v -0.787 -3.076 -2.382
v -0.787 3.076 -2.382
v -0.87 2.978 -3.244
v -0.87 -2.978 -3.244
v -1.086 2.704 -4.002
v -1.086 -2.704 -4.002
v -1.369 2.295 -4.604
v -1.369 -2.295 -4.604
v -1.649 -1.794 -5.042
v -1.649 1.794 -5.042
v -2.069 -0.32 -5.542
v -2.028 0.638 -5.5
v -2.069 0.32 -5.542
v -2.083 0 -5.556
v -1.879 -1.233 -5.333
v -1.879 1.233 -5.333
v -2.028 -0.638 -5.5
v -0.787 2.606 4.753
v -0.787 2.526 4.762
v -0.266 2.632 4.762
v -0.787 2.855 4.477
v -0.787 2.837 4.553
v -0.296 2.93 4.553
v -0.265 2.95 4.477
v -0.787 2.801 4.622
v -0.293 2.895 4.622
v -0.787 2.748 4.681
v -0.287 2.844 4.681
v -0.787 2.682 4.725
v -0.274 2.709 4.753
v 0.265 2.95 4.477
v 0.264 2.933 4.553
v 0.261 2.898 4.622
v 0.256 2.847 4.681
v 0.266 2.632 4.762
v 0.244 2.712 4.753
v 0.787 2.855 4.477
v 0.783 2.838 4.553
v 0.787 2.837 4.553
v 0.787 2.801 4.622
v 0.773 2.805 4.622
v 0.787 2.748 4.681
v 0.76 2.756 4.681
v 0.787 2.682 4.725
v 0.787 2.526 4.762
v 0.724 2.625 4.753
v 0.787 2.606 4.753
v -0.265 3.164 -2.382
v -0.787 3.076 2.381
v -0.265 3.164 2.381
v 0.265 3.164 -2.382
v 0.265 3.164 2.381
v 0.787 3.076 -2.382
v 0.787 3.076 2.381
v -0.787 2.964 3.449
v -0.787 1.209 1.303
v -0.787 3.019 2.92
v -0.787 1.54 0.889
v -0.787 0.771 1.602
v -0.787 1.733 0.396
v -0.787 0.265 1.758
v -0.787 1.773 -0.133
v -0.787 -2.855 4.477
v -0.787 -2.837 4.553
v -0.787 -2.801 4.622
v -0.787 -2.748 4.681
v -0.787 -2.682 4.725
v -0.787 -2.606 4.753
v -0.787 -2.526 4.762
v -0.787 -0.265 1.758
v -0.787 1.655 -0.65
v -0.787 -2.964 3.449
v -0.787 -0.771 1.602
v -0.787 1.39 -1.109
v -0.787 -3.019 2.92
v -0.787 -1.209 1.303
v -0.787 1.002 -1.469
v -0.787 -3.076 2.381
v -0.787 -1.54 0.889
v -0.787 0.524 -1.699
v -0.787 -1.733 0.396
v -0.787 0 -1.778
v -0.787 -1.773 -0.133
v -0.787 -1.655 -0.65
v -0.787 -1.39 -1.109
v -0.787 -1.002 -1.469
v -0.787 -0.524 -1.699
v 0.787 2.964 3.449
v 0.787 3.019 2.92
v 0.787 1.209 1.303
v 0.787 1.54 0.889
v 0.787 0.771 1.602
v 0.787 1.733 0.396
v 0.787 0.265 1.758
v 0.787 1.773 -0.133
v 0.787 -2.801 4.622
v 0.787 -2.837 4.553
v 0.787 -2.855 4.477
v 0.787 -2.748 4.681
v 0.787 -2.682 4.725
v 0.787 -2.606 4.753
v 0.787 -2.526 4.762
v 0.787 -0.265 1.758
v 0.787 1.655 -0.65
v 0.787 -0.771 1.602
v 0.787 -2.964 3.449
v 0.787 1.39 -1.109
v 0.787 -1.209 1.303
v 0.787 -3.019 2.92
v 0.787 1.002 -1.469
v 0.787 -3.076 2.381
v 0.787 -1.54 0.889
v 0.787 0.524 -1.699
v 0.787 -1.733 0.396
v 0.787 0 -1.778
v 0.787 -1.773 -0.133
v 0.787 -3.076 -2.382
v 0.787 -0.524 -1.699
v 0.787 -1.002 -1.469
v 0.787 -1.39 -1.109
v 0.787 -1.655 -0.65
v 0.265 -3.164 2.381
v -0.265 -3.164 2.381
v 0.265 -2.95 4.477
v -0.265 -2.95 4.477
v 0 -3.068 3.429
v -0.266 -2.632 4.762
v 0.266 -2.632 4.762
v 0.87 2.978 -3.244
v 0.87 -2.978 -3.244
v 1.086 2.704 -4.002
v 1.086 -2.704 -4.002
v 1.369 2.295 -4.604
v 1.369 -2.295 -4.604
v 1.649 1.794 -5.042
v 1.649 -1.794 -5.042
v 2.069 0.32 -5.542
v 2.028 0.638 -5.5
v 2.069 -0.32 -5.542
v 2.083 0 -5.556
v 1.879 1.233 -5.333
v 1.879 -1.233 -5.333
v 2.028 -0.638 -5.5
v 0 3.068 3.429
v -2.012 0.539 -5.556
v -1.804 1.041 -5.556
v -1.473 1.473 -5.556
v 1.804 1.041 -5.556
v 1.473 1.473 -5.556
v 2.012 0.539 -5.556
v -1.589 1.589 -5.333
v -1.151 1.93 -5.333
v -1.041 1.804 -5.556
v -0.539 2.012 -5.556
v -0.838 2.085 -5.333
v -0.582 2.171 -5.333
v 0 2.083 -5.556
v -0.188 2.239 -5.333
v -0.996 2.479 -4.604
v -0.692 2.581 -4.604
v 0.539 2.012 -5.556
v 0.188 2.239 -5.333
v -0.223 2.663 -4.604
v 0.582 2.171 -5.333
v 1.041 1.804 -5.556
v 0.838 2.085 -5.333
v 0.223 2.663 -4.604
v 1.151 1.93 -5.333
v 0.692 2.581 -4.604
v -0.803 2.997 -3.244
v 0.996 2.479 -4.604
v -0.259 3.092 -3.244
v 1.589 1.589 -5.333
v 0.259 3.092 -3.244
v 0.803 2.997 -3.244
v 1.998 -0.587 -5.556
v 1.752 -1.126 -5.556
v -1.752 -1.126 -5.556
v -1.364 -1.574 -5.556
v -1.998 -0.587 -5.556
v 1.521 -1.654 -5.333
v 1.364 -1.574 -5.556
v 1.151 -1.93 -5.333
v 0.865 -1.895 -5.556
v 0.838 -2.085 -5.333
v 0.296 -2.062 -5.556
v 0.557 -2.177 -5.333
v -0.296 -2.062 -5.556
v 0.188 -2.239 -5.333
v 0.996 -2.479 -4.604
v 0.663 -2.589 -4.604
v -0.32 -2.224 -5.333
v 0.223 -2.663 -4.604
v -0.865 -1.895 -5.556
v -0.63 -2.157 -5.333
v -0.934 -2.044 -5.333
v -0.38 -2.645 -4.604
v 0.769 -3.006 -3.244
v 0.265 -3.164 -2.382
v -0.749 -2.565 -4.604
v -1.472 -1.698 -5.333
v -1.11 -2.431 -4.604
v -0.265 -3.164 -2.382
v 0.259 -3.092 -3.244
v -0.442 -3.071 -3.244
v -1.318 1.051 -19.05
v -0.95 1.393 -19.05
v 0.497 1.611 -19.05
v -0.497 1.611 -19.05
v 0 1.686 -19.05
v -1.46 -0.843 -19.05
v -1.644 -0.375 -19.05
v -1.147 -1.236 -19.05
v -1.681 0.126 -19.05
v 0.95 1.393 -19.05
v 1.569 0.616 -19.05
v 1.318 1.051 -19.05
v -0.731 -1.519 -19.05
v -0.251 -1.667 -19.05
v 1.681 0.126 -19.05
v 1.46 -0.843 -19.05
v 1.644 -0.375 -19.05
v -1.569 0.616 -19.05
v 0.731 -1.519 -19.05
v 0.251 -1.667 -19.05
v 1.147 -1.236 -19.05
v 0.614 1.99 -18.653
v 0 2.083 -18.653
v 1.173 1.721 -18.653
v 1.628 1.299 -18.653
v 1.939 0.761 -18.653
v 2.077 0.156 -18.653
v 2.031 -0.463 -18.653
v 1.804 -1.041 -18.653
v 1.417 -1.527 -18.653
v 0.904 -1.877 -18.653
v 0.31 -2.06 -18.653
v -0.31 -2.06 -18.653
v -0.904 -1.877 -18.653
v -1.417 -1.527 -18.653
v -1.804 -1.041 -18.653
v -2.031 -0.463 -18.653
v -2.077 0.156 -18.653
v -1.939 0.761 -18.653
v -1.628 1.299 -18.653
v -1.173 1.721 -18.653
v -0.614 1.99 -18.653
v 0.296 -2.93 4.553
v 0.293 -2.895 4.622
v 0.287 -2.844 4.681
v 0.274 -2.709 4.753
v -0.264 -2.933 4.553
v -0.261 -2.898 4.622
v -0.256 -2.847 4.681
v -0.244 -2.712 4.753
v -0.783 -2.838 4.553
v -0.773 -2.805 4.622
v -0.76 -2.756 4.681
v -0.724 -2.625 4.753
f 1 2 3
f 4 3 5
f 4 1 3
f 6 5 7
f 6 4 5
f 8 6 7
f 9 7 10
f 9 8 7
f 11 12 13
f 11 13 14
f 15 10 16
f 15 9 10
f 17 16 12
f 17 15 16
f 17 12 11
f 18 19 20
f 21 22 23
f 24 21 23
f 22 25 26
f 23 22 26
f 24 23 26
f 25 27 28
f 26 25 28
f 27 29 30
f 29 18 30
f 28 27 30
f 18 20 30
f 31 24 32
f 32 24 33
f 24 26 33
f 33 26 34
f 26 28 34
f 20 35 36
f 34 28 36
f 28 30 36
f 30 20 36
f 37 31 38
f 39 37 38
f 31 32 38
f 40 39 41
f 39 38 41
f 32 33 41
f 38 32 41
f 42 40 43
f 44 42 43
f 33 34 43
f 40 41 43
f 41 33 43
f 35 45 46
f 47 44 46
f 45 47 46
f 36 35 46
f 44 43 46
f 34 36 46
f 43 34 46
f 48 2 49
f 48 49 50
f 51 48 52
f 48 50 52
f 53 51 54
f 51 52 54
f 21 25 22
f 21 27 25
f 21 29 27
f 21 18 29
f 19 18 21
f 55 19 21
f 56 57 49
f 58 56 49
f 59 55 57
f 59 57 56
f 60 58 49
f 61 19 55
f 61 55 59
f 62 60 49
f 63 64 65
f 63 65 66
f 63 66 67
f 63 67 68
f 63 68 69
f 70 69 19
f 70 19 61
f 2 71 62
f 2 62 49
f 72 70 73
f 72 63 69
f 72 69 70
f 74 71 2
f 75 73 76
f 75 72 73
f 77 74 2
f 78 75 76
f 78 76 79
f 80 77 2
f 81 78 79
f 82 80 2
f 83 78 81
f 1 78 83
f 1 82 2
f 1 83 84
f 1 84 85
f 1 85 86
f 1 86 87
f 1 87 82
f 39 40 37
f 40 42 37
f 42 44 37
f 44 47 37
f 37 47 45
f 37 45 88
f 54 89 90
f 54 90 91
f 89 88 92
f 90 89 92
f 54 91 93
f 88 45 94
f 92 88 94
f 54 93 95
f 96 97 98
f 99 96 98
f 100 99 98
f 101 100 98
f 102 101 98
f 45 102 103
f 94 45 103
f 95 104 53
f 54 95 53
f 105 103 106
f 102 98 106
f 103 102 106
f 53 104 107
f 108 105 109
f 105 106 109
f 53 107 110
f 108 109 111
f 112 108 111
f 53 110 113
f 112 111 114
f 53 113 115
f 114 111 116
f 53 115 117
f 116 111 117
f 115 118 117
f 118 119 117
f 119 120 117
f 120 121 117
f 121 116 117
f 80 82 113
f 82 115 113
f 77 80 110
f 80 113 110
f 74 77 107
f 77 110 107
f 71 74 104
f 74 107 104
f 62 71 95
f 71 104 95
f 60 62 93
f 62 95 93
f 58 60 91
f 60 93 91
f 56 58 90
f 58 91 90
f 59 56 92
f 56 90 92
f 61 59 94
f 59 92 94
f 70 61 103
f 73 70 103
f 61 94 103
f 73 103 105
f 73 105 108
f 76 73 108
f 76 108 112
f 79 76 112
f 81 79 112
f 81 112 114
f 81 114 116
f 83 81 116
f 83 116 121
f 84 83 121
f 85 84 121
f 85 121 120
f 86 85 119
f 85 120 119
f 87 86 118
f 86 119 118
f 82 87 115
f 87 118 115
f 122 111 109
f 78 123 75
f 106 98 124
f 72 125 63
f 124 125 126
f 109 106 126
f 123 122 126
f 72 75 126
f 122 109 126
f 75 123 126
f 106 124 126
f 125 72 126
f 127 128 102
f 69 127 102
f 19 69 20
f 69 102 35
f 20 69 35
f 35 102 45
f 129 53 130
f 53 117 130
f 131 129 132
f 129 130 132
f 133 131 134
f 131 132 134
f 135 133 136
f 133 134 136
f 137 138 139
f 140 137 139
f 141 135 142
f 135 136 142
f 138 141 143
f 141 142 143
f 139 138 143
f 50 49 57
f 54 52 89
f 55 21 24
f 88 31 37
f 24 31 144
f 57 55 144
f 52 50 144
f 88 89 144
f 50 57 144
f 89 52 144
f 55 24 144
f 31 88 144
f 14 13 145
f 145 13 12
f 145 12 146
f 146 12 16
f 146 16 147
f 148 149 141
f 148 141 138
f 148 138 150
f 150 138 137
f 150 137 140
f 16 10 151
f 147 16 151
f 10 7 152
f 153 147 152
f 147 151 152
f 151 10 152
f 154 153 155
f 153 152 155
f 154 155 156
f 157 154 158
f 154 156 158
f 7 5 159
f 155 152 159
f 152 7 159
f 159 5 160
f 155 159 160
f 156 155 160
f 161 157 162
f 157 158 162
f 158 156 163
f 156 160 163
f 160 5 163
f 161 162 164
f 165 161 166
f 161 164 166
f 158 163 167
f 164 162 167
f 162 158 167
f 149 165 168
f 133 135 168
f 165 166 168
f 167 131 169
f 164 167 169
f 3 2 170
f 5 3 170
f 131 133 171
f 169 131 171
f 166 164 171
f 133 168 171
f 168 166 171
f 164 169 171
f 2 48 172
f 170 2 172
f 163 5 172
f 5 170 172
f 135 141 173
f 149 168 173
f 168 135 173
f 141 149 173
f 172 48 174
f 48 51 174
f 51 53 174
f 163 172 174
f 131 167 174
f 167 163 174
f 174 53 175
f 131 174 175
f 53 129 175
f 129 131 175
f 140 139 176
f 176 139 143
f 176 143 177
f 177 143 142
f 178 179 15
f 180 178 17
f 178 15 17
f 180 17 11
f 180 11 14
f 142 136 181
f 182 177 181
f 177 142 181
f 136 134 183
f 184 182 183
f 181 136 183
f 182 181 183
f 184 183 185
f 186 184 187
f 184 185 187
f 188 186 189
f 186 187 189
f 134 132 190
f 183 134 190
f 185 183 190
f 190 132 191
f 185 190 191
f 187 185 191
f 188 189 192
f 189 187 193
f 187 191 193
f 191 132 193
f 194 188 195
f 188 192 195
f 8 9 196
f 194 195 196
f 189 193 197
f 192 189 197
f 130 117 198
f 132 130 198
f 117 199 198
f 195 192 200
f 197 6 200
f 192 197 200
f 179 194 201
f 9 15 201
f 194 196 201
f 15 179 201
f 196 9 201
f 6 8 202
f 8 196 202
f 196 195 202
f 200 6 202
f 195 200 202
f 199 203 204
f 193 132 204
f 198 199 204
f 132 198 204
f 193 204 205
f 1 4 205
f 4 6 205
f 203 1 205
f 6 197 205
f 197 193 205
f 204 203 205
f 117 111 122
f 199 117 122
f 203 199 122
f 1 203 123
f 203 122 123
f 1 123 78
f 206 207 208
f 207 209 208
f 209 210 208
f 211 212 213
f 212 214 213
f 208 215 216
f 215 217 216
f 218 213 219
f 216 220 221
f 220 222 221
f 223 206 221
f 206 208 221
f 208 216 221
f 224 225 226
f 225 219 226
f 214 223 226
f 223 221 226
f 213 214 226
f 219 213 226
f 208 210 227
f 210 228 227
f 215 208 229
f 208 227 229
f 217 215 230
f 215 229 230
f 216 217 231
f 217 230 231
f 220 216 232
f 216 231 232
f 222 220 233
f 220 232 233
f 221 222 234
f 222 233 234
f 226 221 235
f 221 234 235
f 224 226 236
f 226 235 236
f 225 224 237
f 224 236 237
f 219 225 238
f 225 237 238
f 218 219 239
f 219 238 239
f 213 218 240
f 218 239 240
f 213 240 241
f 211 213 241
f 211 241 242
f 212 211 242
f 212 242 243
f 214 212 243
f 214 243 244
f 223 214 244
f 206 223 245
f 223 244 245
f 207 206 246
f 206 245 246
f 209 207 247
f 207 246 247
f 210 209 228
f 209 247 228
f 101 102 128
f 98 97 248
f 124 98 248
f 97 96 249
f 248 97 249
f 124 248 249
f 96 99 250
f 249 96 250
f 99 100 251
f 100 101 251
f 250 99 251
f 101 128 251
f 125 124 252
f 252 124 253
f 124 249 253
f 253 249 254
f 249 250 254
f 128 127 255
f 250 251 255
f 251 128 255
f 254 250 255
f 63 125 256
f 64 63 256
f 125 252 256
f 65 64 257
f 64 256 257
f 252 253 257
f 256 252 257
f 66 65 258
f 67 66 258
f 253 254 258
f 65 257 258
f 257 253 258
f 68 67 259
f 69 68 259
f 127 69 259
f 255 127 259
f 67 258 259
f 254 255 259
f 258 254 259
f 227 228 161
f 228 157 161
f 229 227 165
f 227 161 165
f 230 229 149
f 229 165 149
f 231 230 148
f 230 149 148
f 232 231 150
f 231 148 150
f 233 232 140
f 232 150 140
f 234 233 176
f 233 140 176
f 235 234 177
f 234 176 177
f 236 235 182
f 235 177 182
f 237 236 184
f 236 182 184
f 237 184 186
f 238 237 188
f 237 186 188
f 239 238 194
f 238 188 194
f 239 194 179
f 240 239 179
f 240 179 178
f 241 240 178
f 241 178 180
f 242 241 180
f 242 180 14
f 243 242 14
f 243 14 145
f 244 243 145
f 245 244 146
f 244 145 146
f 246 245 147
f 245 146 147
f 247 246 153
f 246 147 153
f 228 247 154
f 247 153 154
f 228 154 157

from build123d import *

# Parameters (mm, degrees)
HEAD_CUT_DEPTH      = 20.572014492
HEAD_CUT_DEPTH_BACK = 20.572014492
HOLE_CUT_DEPTH      = 20.424756933
HOLE_CUT_DEPTH_BACK = 20.424756933
SKETCH6_R           = 1.778


with BuildPart() as part:
    # Sketch3 → Body Revolve (revolve)
    with BuildSketch(Plane(origin=(0, 0, 0), x_dir=(0, 0, -1), z_dir=(1, 0, 0))):
        with BuildLine():
            Line((19.05, 0), (19.05, 1.685925))
            Line((19.05, 1.685925), (18.653125, 2.0828))
            Line((18.653125, 2.0828), (5.55625, 2.0828))
            ThreePointArc((5.55625, 2.0828), (4.060634728, 2.894312369), (2.382352325, 3.175))
            Line((2.382352325, 3.175), (-2.38125, 3.175))
            Line((-2.38125, 3.175), (-4.477145765, 2.961701818))
            ThreePointArc((-4.477145765, 2.961701818), (-4.680597677, 2.858671264), (-4.7625, 2.645833333))
            Line((-4.7625, 2.645833333), (-4.7625, 0))
            Line((-4.7625, 0), (19.05, 0))
        make_face()
    revolve(axis=Axis((0, 0, 4.7625), (0, 0, -1)))

    # Sketch5 → Head Cut (cut, two sides: drawn at the far end of the back side and taken through both)
    with BuildSketch(Plane(origin=(0, 0, 0), x_dir=(1, 0, 0), z_dir=(0, 1, 0)).offset(-HEAD_CUT_DEPTH_BACK)):
        with BuildLine():
            Line((-3.9624, 5.55625), (-3.9624, -4.7625))
            Line((-3.9624, -4.7625), (-0.7874, -4.7625))
            Line((-0.7874, -4.7625), (-0.7874, 2.382352325))
            ThreePointArc((-0.7874, 2.382352325), (-1.12371822, 4.096389053), (-2.0828, 5.55625))
            Line((-2.0828, 5.55625), (-3.9624, 5.55625))
        make_face()
        with BuildLine():
            Line((2.0828, 5.55625), (3.9624, 5.55625))
            Line((3.9624, 5.55625), (3.9624, -4.7625))
            Line((3.9624, -4.7625), (0.7874, -4.7625))
            Line((0.7874, -4.7625), (0.7874, 2.382352325))
            ThreePointArc((0.7874, 2.382352325), (1.12371822, 4.096389053), (2.0828, 5.55625))
        make_face()
    extrude(amount=HEAD_CUT_DEPTH + HEAD_CUT_DEPTH_BACK, mode=Mode.SUBTRACT)

    # Sketch6 → Hole Cut (cut, two sides: drawn at the far end of the back side and taken through both)
    with BuildSketch(Plane(origin=(0, 0, 0), x_dir=(0, 0, -1), z_dir=(1, 0, 0)).offset(-HOLE_CUT_DEPTH_BACK)):
        Circle(SKETCH6_R)
    extrude(amount=HOLE_CUT_DEPTH + HOLE_CUT_DEPTH_BACK, mode=Mode.SUBTRACT)


solid = part.part
